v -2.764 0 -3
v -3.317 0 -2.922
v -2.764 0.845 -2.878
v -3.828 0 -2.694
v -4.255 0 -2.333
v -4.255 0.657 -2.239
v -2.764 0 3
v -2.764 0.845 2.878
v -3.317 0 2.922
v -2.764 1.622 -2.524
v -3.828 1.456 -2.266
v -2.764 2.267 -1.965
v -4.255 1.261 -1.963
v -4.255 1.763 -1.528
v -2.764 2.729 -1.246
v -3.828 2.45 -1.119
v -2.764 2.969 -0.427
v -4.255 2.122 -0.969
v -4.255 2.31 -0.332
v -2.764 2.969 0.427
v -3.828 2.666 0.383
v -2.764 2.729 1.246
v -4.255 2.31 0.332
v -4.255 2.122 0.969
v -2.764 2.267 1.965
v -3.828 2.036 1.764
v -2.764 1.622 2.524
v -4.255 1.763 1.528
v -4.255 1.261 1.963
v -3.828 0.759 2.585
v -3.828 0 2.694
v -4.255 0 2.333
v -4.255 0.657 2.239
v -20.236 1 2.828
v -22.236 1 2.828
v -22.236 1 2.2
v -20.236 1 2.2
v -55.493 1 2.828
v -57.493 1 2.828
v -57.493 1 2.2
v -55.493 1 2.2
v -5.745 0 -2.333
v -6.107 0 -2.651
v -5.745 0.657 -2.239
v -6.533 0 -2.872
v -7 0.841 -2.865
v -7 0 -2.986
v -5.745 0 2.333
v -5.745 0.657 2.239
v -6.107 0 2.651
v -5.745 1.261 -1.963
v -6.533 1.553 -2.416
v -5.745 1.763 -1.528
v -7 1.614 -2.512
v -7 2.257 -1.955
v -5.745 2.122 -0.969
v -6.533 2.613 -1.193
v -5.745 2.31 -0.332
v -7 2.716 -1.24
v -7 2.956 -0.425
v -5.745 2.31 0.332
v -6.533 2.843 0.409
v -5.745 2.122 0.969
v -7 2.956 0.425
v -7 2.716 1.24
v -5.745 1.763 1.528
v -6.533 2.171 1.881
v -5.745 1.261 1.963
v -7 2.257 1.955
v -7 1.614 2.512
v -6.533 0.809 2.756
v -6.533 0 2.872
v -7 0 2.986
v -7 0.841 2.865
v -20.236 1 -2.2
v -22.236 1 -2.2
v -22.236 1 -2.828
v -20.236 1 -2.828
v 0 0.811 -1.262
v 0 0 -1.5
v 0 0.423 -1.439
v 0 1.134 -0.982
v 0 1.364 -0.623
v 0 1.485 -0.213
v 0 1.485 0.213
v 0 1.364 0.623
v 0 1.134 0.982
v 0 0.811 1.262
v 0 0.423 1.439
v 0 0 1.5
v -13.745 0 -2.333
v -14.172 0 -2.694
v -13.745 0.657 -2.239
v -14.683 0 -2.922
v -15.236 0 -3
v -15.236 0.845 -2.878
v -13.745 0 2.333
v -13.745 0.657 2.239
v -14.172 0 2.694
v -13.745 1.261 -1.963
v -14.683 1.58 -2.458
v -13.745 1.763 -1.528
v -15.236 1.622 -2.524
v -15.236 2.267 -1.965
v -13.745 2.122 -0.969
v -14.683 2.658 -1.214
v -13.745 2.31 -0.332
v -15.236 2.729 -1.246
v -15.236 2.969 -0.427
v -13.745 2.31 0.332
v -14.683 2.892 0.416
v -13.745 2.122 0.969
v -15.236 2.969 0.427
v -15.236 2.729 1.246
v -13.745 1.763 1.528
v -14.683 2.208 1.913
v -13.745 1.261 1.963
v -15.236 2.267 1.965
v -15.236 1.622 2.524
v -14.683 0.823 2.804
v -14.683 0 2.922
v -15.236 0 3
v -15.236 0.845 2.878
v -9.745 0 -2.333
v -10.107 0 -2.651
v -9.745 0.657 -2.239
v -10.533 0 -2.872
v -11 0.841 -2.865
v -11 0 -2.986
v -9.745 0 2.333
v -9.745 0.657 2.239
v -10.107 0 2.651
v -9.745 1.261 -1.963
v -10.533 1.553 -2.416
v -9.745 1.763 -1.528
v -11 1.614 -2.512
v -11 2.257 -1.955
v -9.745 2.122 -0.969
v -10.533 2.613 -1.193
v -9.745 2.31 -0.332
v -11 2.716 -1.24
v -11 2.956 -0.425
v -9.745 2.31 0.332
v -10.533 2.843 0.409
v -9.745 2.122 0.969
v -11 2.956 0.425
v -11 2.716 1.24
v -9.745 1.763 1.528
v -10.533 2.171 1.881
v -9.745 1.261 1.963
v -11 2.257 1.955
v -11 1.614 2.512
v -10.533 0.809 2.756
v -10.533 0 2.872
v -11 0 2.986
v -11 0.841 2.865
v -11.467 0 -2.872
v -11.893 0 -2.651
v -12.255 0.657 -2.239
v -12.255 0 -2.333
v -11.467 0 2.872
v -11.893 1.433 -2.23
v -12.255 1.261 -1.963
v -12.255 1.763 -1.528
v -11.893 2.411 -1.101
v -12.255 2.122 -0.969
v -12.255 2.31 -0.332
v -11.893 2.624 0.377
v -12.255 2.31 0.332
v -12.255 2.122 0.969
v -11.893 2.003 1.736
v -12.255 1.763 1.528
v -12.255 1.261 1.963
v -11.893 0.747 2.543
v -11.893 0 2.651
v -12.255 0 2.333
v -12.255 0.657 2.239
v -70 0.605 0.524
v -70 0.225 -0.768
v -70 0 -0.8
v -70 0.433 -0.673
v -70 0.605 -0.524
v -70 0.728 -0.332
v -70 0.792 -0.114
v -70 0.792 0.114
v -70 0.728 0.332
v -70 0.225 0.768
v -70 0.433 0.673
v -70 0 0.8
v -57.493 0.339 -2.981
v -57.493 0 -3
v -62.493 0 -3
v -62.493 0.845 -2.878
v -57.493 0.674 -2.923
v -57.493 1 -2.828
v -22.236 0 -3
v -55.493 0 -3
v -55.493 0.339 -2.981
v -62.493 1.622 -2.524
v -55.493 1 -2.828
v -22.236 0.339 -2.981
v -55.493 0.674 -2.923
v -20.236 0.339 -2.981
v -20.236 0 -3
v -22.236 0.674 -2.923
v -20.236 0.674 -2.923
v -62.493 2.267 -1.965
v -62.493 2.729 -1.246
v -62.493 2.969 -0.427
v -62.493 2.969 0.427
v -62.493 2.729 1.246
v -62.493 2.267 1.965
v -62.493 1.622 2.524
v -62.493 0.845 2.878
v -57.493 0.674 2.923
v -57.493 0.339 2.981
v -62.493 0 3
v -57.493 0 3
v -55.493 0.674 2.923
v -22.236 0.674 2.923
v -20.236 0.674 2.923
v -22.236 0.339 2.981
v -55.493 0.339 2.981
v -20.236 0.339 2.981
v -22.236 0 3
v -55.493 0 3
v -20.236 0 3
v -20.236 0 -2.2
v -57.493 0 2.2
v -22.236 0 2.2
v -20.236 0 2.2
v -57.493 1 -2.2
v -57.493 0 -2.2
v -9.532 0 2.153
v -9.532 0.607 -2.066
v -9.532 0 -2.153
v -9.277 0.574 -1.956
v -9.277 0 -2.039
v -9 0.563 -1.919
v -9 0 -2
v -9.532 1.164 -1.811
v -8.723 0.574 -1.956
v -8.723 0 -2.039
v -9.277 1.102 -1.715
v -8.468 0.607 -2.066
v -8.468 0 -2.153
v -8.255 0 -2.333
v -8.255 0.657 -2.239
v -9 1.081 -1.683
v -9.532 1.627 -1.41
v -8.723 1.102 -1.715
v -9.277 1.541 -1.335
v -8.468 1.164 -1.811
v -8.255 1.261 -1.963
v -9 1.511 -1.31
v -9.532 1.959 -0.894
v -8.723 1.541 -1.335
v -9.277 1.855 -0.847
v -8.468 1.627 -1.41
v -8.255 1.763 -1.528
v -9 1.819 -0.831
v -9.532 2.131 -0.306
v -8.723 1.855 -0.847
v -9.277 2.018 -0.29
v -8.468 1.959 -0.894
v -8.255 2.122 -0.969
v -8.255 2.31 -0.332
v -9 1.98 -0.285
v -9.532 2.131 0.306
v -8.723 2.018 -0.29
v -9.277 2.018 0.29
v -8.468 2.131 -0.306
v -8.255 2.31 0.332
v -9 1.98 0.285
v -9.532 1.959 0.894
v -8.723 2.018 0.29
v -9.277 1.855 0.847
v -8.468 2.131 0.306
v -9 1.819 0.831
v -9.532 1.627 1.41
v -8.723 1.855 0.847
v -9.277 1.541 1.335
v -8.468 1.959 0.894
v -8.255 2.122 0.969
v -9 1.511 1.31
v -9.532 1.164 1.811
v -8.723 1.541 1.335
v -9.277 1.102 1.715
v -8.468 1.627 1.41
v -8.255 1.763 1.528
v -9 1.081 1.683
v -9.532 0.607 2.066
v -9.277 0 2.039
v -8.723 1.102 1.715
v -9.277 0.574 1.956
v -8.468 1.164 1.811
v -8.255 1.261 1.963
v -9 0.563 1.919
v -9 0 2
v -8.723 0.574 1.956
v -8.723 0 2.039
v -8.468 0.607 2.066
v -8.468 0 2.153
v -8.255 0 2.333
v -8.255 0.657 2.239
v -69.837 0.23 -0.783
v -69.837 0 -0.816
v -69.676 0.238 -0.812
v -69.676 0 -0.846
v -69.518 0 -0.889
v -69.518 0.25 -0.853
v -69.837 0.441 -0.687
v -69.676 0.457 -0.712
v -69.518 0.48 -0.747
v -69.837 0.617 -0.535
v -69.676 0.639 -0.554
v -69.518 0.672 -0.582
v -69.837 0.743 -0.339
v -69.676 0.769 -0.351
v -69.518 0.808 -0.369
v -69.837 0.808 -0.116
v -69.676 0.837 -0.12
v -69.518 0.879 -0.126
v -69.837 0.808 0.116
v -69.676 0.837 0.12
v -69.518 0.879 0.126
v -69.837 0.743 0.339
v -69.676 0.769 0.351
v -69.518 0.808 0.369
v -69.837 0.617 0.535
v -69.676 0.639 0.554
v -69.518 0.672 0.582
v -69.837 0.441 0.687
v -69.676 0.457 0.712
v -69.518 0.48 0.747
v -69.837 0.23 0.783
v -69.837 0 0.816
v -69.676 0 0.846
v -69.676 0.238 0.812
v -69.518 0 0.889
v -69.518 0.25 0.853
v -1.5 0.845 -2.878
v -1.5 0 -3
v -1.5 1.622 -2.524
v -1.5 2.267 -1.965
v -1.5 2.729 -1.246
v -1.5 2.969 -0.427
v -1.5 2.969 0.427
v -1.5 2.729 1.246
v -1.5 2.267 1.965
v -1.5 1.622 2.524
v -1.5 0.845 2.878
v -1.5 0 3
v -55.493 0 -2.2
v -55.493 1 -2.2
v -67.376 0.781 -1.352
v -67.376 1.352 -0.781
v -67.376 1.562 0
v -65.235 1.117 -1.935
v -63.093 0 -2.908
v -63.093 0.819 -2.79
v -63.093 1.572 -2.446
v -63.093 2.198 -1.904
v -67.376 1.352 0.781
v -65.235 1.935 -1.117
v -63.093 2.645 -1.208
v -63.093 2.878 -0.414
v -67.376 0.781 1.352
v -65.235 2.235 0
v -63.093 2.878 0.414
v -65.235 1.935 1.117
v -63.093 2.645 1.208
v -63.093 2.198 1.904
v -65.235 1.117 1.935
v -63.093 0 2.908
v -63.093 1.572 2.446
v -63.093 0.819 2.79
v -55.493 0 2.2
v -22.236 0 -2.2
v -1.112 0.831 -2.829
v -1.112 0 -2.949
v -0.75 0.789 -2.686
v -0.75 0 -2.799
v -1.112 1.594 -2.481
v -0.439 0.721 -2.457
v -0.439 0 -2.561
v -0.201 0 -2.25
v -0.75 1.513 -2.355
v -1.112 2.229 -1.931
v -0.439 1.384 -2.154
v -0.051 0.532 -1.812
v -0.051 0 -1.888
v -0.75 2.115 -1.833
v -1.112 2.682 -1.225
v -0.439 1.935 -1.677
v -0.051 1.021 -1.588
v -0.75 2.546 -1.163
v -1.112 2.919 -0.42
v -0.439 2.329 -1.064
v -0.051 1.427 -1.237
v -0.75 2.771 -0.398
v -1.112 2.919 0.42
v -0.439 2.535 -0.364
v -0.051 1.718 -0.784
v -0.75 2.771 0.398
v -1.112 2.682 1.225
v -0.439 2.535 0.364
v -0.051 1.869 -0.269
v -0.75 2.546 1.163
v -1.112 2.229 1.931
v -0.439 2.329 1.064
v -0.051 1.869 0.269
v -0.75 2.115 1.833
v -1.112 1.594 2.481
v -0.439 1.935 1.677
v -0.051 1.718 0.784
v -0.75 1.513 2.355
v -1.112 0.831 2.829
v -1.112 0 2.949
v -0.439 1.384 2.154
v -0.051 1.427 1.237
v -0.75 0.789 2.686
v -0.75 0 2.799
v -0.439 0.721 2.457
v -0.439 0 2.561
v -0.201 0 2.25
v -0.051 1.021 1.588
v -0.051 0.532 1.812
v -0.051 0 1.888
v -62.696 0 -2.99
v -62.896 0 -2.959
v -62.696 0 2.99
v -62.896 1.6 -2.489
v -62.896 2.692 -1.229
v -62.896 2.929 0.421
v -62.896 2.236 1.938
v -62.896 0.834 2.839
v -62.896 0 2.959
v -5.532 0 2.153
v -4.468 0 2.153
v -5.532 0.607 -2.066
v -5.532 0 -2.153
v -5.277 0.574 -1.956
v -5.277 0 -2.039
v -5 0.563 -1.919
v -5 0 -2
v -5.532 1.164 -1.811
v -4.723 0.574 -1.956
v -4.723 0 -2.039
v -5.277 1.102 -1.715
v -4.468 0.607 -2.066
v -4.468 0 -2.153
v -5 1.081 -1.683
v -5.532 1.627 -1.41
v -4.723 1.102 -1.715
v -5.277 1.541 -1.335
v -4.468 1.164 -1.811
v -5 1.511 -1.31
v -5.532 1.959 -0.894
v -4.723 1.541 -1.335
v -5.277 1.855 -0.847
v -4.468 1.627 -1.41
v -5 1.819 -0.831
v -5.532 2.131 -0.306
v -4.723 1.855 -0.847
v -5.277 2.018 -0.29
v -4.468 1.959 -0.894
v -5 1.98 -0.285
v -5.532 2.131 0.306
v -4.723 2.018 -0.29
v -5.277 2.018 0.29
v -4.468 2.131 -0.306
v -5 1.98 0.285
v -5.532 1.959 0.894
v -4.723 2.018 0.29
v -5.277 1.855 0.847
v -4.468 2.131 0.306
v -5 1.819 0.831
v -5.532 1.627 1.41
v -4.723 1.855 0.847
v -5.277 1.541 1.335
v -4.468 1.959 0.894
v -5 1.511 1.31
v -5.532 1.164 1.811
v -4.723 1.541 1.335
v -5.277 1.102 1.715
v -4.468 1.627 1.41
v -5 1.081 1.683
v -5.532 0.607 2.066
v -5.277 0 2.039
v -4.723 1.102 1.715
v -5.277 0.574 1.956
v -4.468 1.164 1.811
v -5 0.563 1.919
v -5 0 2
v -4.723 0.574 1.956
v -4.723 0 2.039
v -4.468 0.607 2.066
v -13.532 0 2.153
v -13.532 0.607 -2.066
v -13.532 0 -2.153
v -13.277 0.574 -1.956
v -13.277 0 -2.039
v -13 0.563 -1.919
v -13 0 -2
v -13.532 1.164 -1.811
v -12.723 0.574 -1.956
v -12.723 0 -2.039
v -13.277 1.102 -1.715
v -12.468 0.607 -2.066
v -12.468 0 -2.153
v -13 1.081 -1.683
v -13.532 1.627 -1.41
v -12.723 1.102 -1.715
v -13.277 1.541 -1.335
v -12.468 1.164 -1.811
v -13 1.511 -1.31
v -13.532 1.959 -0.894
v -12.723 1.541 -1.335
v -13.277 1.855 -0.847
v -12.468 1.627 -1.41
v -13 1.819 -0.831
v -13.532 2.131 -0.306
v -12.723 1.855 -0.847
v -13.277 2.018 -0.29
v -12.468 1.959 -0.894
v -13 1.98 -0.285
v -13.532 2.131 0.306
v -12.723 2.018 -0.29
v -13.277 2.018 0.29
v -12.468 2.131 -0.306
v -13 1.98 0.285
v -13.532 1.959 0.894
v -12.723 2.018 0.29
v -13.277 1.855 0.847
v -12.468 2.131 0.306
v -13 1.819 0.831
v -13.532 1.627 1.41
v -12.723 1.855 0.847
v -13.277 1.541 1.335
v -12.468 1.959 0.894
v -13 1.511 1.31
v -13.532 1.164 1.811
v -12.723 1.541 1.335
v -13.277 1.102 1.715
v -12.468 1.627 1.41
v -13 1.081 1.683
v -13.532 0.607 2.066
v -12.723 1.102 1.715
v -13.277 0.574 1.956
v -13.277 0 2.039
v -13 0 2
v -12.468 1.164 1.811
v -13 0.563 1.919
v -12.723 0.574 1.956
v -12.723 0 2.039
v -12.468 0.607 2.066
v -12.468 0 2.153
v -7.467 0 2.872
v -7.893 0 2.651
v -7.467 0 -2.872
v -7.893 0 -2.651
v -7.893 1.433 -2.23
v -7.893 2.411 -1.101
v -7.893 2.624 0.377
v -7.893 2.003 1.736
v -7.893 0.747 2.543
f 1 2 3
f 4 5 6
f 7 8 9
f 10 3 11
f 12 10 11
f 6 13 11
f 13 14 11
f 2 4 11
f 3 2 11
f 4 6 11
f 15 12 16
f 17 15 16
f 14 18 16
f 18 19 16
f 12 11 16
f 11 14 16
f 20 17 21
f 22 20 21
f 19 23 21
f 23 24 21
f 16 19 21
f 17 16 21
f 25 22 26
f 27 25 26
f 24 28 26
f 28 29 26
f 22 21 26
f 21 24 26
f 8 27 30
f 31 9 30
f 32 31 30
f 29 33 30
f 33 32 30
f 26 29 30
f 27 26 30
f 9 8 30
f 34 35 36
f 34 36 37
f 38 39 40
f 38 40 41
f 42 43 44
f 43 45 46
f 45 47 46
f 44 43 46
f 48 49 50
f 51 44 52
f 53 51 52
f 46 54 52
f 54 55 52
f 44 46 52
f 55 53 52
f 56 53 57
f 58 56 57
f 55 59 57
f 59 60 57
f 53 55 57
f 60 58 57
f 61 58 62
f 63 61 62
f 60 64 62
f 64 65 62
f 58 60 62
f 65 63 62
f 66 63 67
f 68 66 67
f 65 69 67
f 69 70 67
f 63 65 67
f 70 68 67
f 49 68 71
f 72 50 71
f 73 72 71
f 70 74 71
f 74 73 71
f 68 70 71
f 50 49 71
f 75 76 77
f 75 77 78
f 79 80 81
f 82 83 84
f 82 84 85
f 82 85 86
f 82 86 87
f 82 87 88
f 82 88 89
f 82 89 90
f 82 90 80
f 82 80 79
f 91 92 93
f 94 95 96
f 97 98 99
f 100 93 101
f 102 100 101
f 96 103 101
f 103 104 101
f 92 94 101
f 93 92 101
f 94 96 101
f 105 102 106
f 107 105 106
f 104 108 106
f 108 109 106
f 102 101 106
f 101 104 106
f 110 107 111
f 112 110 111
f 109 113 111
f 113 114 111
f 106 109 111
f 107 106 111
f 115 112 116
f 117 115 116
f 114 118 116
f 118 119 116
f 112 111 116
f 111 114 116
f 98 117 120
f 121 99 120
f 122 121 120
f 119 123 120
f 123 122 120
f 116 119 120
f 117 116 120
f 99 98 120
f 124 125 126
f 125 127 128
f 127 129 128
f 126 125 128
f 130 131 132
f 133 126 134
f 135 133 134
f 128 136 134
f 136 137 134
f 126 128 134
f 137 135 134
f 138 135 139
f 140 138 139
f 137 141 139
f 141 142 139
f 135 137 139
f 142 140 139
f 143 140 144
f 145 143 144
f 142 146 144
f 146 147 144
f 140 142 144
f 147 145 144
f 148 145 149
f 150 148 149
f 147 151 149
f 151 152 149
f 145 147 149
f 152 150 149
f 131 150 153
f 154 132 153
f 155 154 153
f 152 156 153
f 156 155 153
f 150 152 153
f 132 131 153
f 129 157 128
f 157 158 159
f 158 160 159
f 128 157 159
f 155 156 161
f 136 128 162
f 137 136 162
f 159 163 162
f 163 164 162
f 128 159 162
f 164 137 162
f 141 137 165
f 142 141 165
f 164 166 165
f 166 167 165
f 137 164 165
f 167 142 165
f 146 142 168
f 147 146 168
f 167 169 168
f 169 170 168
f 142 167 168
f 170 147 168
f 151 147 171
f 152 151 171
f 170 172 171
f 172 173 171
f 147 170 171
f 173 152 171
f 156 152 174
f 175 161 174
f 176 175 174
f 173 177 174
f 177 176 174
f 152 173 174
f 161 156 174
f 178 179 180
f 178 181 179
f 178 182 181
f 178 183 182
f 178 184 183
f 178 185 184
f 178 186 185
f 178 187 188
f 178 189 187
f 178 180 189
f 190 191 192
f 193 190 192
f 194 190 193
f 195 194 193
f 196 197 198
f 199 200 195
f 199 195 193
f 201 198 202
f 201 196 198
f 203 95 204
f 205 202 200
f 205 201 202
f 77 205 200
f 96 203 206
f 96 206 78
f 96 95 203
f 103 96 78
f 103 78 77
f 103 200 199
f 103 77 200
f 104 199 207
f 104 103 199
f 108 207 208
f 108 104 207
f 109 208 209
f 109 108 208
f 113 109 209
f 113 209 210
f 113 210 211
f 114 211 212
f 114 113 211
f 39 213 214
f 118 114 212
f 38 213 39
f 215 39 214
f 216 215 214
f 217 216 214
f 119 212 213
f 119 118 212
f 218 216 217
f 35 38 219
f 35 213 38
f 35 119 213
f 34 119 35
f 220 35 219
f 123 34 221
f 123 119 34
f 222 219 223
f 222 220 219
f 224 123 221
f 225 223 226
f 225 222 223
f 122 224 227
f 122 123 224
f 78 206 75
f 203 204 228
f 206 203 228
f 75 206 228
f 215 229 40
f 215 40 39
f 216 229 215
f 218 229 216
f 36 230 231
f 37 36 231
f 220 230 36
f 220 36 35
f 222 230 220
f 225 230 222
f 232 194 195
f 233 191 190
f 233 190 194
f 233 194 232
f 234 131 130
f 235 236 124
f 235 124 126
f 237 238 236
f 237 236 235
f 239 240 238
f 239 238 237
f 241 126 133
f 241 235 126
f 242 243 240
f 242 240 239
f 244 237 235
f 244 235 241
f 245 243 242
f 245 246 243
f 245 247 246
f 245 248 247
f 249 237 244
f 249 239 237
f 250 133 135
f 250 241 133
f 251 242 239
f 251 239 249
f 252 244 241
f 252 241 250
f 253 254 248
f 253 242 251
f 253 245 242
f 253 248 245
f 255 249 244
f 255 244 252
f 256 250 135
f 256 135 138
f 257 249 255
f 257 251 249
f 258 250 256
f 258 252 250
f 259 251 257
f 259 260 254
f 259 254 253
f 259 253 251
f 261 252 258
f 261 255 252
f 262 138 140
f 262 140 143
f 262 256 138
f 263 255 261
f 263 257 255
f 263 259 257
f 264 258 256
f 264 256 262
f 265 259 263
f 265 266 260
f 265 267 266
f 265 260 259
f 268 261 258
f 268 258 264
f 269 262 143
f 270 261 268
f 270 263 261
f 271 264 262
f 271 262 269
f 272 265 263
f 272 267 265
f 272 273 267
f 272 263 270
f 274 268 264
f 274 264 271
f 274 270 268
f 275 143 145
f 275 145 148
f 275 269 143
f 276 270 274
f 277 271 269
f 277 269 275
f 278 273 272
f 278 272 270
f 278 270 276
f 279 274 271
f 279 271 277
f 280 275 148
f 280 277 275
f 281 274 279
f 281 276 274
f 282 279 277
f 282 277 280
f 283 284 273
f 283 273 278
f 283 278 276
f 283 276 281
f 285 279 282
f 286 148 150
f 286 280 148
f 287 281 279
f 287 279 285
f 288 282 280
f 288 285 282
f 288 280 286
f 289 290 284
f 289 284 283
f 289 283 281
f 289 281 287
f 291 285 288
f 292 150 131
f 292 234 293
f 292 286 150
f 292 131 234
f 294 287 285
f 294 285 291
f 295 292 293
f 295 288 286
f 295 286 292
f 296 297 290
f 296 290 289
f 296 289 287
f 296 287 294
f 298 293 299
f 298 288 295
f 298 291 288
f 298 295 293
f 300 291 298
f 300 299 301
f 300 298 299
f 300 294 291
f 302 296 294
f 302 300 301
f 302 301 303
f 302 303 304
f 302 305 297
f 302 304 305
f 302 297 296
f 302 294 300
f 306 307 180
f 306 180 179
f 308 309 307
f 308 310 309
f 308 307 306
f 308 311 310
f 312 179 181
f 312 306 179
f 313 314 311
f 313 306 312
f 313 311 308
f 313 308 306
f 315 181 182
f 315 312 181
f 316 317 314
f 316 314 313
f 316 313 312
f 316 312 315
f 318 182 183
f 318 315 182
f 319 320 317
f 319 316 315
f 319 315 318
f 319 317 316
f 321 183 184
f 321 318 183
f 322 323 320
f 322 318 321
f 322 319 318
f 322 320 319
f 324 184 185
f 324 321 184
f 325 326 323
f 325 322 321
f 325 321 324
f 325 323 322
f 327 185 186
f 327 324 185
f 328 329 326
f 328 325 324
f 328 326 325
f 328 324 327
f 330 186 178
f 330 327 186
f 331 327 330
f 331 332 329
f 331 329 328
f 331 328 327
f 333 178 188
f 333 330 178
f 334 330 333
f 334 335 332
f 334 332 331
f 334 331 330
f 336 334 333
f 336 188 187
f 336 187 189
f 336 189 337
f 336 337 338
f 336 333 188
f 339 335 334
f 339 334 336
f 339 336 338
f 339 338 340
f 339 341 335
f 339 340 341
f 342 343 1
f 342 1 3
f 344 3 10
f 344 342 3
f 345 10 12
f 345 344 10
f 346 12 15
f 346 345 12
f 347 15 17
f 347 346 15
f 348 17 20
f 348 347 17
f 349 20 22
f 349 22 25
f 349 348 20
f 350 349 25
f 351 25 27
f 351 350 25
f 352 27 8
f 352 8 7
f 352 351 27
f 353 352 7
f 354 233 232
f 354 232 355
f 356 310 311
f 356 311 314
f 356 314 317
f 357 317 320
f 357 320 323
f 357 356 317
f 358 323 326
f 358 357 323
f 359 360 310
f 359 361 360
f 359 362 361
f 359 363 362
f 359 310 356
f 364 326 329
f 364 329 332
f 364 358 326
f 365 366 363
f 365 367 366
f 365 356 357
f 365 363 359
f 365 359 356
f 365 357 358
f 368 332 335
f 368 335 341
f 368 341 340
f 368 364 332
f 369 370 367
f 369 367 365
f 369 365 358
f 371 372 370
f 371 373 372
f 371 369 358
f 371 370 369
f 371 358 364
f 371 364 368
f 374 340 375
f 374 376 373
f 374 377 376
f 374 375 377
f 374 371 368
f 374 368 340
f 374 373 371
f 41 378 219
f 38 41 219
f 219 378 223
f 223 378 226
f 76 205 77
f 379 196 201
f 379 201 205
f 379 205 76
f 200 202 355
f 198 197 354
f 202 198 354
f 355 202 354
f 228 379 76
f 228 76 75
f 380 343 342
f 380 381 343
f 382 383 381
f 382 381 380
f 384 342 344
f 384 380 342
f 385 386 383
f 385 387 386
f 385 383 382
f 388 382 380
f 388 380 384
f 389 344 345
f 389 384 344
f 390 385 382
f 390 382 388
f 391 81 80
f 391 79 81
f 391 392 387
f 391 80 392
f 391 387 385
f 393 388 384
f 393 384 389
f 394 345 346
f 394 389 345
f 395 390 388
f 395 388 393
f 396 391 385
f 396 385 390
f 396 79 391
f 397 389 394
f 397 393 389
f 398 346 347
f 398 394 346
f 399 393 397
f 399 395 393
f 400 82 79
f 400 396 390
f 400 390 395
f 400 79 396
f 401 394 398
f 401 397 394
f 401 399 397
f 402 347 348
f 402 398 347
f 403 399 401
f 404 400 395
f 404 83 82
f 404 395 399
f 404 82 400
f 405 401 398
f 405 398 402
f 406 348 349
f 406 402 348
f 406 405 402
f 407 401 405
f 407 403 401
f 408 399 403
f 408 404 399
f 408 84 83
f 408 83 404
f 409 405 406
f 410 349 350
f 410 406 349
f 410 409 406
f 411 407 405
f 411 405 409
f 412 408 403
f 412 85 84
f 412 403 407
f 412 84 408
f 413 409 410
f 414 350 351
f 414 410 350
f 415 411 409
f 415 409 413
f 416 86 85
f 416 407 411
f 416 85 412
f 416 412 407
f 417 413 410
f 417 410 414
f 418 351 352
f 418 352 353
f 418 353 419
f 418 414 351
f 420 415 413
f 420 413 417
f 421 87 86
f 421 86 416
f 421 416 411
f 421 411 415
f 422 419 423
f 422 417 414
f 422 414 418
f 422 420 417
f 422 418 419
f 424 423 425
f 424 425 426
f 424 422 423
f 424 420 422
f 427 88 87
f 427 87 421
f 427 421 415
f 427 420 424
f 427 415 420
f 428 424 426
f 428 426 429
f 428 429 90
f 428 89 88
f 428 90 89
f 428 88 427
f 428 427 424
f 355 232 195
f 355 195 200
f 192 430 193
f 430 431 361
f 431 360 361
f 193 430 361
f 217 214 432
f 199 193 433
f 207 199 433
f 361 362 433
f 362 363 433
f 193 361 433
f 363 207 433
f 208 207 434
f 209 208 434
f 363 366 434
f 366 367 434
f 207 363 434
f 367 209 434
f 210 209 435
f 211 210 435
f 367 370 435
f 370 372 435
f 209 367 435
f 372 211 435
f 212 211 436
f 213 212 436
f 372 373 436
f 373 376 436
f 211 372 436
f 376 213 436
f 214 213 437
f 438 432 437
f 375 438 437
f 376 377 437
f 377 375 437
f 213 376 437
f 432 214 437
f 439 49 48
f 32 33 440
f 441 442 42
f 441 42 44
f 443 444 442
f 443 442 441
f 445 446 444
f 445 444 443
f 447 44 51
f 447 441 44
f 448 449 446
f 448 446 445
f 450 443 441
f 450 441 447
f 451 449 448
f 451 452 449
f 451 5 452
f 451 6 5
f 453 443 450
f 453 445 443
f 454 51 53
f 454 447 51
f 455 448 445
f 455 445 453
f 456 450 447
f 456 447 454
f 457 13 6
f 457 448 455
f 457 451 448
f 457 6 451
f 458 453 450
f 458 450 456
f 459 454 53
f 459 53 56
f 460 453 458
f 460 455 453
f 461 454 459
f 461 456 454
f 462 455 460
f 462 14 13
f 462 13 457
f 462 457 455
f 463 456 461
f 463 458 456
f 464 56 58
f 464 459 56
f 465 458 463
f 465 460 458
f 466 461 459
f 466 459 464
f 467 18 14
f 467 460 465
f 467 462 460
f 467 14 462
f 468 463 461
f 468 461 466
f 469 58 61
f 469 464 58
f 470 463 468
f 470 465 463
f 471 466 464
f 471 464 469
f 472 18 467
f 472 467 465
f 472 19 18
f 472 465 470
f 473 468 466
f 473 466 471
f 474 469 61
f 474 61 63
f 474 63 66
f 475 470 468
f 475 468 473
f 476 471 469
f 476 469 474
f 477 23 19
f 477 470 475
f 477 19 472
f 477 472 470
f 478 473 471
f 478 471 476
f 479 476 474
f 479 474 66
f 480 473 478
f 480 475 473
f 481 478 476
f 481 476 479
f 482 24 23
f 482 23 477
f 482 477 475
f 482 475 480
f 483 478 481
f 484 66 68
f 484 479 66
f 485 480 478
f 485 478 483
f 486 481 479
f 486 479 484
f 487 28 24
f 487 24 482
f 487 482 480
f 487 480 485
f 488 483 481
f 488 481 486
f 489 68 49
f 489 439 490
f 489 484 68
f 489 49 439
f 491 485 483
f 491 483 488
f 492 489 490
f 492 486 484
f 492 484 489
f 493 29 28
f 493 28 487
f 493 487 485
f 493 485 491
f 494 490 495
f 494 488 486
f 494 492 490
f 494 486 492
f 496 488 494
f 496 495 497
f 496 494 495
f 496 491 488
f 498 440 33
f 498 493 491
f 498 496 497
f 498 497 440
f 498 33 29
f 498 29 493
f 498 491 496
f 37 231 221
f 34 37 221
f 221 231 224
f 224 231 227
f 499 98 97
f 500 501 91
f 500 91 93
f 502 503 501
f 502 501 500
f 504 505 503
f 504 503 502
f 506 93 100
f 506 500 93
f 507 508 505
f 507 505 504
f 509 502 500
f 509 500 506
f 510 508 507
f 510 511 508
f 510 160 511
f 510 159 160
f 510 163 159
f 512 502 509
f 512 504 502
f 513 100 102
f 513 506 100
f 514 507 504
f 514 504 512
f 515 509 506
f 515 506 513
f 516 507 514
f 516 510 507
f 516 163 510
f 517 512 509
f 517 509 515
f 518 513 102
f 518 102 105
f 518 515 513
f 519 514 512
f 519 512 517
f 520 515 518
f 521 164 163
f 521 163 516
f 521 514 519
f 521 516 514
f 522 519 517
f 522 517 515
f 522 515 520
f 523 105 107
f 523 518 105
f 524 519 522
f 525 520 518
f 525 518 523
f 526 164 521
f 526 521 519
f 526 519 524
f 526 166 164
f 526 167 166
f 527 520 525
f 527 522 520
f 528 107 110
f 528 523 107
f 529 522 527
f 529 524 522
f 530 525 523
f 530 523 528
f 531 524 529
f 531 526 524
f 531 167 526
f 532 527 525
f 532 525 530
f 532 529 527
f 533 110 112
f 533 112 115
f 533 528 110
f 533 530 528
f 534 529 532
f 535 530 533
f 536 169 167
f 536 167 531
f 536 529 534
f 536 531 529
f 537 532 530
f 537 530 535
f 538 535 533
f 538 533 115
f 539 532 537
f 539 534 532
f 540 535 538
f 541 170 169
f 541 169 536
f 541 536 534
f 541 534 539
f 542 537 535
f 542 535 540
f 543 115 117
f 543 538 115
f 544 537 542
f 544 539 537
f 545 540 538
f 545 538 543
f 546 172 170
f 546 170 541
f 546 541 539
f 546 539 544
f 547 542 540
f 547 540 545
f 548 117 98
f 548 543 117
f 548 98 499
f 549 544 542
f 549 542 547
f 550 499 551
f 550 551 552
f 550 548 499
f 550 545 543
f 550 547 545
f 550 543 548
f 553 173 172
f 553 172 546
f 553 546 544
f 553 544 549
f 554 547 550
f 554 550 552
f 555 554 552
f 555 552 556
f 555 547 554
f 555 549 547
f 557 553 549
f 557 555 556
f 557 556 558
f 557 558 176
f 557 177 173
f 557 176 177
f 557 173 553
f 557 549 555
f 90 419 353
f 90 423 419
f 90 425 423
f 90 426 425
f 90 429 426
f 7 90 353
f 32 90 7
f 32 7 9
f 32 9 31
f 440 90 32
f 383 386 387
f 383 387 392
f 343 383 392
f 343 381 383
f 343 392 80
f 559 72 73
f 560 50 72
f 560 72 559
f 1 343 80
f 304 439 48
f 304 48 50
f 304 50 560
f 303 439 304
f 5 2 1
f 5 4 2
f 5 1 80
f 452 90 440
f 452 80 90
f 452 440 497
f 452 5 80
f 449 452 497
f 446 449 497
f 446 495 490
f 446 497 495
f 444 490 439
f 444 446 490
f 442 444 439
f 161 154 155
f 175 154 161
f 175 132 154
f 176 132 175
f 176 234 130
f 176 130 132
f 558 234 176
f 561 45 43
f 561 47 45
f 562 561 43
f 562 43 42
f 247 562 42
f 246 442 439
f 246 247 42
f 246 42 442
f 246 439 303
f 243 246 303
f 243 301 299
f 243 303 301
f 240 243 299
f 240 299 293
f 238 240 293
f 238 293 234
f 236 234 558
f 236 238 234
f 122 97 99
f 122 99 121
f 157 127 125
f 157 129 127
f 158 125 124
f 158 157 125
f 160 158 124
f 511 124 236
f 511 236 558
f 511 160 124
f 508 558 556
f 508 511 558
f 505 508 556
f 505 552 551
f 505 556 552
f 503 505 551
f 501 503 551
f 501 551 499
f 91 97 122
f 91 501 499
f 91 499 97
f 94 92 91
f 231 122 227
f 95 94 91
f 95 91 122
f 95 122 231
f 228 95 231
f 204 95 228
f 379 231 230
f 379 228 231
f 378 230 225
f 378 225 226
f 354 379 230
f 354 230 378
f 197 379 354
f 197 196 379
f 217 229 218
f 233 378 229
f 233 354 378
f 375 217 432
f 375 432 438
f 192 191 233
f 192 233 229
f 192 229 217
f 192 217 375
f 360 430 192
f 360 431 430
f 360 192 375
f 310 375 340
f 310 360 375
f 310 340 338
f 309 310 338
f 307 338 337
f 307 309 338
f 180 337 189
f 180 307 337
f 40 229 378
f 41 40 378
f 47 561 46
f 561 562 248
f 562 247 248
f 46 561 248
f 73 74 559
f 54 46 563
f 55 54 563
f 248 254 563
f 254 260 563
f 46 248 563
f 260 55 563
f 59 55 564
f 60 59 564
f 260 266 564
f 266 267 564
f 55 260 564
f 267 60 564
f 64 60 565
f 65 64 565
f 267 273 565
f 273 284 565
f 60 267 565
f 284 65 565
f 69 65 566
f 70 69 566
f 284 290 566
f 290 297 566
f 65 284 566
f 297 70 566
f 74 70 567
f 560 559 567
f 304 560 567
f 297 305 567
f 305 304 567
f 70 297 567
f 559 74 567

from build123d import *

# Parameters (mm, degrees)
REVOLVE1_ANGLE     = 180
FILLET1_ANGLE      = 180
FILLET1_2_ANGLE    = 180
SKETCH2_W          = 2
SKETCH2_H          = 0.8
CUT_EXTRUDE1_DEPTH = 1


with BuildPart() as part:
    # Sketch1 → Revolve1 (revolve)
    with BuildSketch(Plane(origin=(0, 0, 0), x_dir=(1, 0, 0), z_dir=(0, 1, 0))):
        with BuildLine():
            Line((0, 0), (-70, 0))
            Line((-70, 0), (-70, 0.8))
            Line((-70, 0.8), (-69.8, 0.8))
            Line((-69.8, 0.8), (-62.8, 3))
            Line((-62.8, 3), (-14, 3))
            ThreePointArc((-14, 3), (-13, 2), (-12, 3))
            Line((-12, 3), (-10, 3))
            ThreePointArc((-10, 3), (-9, 2), (-8, 3))
            Line((-8, 3), (-6, 3))
            ThreePointArc((-6, 3), (-5, 2), (-4, 3))
            Line((-4, 3), (-1.5, 3))
            ThreePointArc((-1.5, 3), (-0.439339828, 2.560660172), (0, 1.5))
            Line((0, 1.5), (0, 0))
        make_face()
    revolve(axis=Axis((0, 0, 0), (1, 0, 0)), revolution_arc=REVOLVE1_ANGLE)

    # Fillet1: read off the stored shape, not the designer's step
    # Fillet1 outline → Fillet1 (revolve)
    with BuildSketch(Plane(origin=(0, 0, 0), x_dir=(0, 0, -1), z_dir=(0, -1, 0))):
        with BuildLine():
            Line((0.8, -69.518311709), (0.8, -70))
            ThreePointArc((0.8, -70), (0.829465257, -69.75643572), (0.888530606, -69.518311709))
            Line((0.888530606, -69.518311709), (0.8, -69.518311709))
        make_face()
    revolve(axis=Axis((0, 0, 0), (1, 0, 0)), revolution_arc=FILLET1_ANGLE)

    # Fillet1 2 outline → Fillet1 2 (revolve, cut)
    with BuildSketch(Plane(origin=(0, 0, 0), x_dir=(0, 0, -1), z_dir=(0, -1, 0))):
        with BuildLine():
            ThreePointArc((3, -62.493114063), (2.976863029, -62.796449795), (2.907987434, -63.092767256))
            Line((2.907987434, -63.092767256), (3, -63.092767256))
            Line((3, -63.092767256), (3, -62.493114063))
        make_face()
        with BuildLine():
            Line((3, -15.236067977), (3, -13.745355992))
            Line((3, -13.745355992), (2.333333333, -13.745355992))
            ThreePointArc((2.333333333, -13.745355992), (2.825741858, -14.419571396), (3, -15.236067977))
        make_face()
        with BuildLine():
            Line((2.333333333, -12.254644008), (3, -12.254644008))
            Line((3, -12.254644008), (3, -9.745355992))
            Line((3, -9.745355992), (2.333333333, -9.745355992))
            ThreePointArc((2.333333333, -9.745355992), (2.774276771, -10.313060967), (2.986019111, -11))
            ThreePointArc((2.986019111, -11), (2.774276771, -11.686939033), (2.333333333, -12.254644008))
        make_face()
        with BuildLine():
            Line((2.333333333, -8.254644008), (3, -8.254644008))
            Line((3, -8.254644008), (3, -5.745355992))
            Line((3, -5.745355992), (2.333333333, -5.745355992))
            ThreePointArc((2.333333333, -5.745355992), (2.774276771, -6.313060967), (2.986019111, -7))
            ThreePointArc((2.986019111, -7), (2.774276771, -7.686939033), (2.333333333, -8.254644008))
        make_face()
        with BuildLine():
            Line((2.333333333, -4.254644008), (3, -4.254644008))
            Line((3, -4.254644008), (3, -2.763932023))
            ThreePointArc((3, -2.763932023), (2.825741858, -3.580428604), (2.333333333, -4.254644008))
        make_face()
    revolve(axis=Axis((0, 0, 0), (1, 0, 0)), revolution_arc=FILLET1_2_ANGLE, mode=Mode.SUBTRACT)

    # Sketch2 → Cut-Extrude1 (cut)
    with BuildSketch(Plane.XZ):
        with Locations((-56.493114063, -2.6)):
            Rectangle(SKETCH2_W, SKETCH2_H)
        with Locations((-21.236067977, -2.6)):
            Rectangle(SKETCH2_W, SKETCH2_H)
        with Locations((-21.236067977, 2.6)):
            Rectangle(SKETCH2_W, SKETCH2_H)
        with Locations((-56.493114063, 2.6)):
            Rectangle(SKETCH2_W, SKETCH2_H)
    extrude(amount=-CUT_EXTRUDE1_DEPTH, mode=Mode.SUBTRACT)


solid = part.part
